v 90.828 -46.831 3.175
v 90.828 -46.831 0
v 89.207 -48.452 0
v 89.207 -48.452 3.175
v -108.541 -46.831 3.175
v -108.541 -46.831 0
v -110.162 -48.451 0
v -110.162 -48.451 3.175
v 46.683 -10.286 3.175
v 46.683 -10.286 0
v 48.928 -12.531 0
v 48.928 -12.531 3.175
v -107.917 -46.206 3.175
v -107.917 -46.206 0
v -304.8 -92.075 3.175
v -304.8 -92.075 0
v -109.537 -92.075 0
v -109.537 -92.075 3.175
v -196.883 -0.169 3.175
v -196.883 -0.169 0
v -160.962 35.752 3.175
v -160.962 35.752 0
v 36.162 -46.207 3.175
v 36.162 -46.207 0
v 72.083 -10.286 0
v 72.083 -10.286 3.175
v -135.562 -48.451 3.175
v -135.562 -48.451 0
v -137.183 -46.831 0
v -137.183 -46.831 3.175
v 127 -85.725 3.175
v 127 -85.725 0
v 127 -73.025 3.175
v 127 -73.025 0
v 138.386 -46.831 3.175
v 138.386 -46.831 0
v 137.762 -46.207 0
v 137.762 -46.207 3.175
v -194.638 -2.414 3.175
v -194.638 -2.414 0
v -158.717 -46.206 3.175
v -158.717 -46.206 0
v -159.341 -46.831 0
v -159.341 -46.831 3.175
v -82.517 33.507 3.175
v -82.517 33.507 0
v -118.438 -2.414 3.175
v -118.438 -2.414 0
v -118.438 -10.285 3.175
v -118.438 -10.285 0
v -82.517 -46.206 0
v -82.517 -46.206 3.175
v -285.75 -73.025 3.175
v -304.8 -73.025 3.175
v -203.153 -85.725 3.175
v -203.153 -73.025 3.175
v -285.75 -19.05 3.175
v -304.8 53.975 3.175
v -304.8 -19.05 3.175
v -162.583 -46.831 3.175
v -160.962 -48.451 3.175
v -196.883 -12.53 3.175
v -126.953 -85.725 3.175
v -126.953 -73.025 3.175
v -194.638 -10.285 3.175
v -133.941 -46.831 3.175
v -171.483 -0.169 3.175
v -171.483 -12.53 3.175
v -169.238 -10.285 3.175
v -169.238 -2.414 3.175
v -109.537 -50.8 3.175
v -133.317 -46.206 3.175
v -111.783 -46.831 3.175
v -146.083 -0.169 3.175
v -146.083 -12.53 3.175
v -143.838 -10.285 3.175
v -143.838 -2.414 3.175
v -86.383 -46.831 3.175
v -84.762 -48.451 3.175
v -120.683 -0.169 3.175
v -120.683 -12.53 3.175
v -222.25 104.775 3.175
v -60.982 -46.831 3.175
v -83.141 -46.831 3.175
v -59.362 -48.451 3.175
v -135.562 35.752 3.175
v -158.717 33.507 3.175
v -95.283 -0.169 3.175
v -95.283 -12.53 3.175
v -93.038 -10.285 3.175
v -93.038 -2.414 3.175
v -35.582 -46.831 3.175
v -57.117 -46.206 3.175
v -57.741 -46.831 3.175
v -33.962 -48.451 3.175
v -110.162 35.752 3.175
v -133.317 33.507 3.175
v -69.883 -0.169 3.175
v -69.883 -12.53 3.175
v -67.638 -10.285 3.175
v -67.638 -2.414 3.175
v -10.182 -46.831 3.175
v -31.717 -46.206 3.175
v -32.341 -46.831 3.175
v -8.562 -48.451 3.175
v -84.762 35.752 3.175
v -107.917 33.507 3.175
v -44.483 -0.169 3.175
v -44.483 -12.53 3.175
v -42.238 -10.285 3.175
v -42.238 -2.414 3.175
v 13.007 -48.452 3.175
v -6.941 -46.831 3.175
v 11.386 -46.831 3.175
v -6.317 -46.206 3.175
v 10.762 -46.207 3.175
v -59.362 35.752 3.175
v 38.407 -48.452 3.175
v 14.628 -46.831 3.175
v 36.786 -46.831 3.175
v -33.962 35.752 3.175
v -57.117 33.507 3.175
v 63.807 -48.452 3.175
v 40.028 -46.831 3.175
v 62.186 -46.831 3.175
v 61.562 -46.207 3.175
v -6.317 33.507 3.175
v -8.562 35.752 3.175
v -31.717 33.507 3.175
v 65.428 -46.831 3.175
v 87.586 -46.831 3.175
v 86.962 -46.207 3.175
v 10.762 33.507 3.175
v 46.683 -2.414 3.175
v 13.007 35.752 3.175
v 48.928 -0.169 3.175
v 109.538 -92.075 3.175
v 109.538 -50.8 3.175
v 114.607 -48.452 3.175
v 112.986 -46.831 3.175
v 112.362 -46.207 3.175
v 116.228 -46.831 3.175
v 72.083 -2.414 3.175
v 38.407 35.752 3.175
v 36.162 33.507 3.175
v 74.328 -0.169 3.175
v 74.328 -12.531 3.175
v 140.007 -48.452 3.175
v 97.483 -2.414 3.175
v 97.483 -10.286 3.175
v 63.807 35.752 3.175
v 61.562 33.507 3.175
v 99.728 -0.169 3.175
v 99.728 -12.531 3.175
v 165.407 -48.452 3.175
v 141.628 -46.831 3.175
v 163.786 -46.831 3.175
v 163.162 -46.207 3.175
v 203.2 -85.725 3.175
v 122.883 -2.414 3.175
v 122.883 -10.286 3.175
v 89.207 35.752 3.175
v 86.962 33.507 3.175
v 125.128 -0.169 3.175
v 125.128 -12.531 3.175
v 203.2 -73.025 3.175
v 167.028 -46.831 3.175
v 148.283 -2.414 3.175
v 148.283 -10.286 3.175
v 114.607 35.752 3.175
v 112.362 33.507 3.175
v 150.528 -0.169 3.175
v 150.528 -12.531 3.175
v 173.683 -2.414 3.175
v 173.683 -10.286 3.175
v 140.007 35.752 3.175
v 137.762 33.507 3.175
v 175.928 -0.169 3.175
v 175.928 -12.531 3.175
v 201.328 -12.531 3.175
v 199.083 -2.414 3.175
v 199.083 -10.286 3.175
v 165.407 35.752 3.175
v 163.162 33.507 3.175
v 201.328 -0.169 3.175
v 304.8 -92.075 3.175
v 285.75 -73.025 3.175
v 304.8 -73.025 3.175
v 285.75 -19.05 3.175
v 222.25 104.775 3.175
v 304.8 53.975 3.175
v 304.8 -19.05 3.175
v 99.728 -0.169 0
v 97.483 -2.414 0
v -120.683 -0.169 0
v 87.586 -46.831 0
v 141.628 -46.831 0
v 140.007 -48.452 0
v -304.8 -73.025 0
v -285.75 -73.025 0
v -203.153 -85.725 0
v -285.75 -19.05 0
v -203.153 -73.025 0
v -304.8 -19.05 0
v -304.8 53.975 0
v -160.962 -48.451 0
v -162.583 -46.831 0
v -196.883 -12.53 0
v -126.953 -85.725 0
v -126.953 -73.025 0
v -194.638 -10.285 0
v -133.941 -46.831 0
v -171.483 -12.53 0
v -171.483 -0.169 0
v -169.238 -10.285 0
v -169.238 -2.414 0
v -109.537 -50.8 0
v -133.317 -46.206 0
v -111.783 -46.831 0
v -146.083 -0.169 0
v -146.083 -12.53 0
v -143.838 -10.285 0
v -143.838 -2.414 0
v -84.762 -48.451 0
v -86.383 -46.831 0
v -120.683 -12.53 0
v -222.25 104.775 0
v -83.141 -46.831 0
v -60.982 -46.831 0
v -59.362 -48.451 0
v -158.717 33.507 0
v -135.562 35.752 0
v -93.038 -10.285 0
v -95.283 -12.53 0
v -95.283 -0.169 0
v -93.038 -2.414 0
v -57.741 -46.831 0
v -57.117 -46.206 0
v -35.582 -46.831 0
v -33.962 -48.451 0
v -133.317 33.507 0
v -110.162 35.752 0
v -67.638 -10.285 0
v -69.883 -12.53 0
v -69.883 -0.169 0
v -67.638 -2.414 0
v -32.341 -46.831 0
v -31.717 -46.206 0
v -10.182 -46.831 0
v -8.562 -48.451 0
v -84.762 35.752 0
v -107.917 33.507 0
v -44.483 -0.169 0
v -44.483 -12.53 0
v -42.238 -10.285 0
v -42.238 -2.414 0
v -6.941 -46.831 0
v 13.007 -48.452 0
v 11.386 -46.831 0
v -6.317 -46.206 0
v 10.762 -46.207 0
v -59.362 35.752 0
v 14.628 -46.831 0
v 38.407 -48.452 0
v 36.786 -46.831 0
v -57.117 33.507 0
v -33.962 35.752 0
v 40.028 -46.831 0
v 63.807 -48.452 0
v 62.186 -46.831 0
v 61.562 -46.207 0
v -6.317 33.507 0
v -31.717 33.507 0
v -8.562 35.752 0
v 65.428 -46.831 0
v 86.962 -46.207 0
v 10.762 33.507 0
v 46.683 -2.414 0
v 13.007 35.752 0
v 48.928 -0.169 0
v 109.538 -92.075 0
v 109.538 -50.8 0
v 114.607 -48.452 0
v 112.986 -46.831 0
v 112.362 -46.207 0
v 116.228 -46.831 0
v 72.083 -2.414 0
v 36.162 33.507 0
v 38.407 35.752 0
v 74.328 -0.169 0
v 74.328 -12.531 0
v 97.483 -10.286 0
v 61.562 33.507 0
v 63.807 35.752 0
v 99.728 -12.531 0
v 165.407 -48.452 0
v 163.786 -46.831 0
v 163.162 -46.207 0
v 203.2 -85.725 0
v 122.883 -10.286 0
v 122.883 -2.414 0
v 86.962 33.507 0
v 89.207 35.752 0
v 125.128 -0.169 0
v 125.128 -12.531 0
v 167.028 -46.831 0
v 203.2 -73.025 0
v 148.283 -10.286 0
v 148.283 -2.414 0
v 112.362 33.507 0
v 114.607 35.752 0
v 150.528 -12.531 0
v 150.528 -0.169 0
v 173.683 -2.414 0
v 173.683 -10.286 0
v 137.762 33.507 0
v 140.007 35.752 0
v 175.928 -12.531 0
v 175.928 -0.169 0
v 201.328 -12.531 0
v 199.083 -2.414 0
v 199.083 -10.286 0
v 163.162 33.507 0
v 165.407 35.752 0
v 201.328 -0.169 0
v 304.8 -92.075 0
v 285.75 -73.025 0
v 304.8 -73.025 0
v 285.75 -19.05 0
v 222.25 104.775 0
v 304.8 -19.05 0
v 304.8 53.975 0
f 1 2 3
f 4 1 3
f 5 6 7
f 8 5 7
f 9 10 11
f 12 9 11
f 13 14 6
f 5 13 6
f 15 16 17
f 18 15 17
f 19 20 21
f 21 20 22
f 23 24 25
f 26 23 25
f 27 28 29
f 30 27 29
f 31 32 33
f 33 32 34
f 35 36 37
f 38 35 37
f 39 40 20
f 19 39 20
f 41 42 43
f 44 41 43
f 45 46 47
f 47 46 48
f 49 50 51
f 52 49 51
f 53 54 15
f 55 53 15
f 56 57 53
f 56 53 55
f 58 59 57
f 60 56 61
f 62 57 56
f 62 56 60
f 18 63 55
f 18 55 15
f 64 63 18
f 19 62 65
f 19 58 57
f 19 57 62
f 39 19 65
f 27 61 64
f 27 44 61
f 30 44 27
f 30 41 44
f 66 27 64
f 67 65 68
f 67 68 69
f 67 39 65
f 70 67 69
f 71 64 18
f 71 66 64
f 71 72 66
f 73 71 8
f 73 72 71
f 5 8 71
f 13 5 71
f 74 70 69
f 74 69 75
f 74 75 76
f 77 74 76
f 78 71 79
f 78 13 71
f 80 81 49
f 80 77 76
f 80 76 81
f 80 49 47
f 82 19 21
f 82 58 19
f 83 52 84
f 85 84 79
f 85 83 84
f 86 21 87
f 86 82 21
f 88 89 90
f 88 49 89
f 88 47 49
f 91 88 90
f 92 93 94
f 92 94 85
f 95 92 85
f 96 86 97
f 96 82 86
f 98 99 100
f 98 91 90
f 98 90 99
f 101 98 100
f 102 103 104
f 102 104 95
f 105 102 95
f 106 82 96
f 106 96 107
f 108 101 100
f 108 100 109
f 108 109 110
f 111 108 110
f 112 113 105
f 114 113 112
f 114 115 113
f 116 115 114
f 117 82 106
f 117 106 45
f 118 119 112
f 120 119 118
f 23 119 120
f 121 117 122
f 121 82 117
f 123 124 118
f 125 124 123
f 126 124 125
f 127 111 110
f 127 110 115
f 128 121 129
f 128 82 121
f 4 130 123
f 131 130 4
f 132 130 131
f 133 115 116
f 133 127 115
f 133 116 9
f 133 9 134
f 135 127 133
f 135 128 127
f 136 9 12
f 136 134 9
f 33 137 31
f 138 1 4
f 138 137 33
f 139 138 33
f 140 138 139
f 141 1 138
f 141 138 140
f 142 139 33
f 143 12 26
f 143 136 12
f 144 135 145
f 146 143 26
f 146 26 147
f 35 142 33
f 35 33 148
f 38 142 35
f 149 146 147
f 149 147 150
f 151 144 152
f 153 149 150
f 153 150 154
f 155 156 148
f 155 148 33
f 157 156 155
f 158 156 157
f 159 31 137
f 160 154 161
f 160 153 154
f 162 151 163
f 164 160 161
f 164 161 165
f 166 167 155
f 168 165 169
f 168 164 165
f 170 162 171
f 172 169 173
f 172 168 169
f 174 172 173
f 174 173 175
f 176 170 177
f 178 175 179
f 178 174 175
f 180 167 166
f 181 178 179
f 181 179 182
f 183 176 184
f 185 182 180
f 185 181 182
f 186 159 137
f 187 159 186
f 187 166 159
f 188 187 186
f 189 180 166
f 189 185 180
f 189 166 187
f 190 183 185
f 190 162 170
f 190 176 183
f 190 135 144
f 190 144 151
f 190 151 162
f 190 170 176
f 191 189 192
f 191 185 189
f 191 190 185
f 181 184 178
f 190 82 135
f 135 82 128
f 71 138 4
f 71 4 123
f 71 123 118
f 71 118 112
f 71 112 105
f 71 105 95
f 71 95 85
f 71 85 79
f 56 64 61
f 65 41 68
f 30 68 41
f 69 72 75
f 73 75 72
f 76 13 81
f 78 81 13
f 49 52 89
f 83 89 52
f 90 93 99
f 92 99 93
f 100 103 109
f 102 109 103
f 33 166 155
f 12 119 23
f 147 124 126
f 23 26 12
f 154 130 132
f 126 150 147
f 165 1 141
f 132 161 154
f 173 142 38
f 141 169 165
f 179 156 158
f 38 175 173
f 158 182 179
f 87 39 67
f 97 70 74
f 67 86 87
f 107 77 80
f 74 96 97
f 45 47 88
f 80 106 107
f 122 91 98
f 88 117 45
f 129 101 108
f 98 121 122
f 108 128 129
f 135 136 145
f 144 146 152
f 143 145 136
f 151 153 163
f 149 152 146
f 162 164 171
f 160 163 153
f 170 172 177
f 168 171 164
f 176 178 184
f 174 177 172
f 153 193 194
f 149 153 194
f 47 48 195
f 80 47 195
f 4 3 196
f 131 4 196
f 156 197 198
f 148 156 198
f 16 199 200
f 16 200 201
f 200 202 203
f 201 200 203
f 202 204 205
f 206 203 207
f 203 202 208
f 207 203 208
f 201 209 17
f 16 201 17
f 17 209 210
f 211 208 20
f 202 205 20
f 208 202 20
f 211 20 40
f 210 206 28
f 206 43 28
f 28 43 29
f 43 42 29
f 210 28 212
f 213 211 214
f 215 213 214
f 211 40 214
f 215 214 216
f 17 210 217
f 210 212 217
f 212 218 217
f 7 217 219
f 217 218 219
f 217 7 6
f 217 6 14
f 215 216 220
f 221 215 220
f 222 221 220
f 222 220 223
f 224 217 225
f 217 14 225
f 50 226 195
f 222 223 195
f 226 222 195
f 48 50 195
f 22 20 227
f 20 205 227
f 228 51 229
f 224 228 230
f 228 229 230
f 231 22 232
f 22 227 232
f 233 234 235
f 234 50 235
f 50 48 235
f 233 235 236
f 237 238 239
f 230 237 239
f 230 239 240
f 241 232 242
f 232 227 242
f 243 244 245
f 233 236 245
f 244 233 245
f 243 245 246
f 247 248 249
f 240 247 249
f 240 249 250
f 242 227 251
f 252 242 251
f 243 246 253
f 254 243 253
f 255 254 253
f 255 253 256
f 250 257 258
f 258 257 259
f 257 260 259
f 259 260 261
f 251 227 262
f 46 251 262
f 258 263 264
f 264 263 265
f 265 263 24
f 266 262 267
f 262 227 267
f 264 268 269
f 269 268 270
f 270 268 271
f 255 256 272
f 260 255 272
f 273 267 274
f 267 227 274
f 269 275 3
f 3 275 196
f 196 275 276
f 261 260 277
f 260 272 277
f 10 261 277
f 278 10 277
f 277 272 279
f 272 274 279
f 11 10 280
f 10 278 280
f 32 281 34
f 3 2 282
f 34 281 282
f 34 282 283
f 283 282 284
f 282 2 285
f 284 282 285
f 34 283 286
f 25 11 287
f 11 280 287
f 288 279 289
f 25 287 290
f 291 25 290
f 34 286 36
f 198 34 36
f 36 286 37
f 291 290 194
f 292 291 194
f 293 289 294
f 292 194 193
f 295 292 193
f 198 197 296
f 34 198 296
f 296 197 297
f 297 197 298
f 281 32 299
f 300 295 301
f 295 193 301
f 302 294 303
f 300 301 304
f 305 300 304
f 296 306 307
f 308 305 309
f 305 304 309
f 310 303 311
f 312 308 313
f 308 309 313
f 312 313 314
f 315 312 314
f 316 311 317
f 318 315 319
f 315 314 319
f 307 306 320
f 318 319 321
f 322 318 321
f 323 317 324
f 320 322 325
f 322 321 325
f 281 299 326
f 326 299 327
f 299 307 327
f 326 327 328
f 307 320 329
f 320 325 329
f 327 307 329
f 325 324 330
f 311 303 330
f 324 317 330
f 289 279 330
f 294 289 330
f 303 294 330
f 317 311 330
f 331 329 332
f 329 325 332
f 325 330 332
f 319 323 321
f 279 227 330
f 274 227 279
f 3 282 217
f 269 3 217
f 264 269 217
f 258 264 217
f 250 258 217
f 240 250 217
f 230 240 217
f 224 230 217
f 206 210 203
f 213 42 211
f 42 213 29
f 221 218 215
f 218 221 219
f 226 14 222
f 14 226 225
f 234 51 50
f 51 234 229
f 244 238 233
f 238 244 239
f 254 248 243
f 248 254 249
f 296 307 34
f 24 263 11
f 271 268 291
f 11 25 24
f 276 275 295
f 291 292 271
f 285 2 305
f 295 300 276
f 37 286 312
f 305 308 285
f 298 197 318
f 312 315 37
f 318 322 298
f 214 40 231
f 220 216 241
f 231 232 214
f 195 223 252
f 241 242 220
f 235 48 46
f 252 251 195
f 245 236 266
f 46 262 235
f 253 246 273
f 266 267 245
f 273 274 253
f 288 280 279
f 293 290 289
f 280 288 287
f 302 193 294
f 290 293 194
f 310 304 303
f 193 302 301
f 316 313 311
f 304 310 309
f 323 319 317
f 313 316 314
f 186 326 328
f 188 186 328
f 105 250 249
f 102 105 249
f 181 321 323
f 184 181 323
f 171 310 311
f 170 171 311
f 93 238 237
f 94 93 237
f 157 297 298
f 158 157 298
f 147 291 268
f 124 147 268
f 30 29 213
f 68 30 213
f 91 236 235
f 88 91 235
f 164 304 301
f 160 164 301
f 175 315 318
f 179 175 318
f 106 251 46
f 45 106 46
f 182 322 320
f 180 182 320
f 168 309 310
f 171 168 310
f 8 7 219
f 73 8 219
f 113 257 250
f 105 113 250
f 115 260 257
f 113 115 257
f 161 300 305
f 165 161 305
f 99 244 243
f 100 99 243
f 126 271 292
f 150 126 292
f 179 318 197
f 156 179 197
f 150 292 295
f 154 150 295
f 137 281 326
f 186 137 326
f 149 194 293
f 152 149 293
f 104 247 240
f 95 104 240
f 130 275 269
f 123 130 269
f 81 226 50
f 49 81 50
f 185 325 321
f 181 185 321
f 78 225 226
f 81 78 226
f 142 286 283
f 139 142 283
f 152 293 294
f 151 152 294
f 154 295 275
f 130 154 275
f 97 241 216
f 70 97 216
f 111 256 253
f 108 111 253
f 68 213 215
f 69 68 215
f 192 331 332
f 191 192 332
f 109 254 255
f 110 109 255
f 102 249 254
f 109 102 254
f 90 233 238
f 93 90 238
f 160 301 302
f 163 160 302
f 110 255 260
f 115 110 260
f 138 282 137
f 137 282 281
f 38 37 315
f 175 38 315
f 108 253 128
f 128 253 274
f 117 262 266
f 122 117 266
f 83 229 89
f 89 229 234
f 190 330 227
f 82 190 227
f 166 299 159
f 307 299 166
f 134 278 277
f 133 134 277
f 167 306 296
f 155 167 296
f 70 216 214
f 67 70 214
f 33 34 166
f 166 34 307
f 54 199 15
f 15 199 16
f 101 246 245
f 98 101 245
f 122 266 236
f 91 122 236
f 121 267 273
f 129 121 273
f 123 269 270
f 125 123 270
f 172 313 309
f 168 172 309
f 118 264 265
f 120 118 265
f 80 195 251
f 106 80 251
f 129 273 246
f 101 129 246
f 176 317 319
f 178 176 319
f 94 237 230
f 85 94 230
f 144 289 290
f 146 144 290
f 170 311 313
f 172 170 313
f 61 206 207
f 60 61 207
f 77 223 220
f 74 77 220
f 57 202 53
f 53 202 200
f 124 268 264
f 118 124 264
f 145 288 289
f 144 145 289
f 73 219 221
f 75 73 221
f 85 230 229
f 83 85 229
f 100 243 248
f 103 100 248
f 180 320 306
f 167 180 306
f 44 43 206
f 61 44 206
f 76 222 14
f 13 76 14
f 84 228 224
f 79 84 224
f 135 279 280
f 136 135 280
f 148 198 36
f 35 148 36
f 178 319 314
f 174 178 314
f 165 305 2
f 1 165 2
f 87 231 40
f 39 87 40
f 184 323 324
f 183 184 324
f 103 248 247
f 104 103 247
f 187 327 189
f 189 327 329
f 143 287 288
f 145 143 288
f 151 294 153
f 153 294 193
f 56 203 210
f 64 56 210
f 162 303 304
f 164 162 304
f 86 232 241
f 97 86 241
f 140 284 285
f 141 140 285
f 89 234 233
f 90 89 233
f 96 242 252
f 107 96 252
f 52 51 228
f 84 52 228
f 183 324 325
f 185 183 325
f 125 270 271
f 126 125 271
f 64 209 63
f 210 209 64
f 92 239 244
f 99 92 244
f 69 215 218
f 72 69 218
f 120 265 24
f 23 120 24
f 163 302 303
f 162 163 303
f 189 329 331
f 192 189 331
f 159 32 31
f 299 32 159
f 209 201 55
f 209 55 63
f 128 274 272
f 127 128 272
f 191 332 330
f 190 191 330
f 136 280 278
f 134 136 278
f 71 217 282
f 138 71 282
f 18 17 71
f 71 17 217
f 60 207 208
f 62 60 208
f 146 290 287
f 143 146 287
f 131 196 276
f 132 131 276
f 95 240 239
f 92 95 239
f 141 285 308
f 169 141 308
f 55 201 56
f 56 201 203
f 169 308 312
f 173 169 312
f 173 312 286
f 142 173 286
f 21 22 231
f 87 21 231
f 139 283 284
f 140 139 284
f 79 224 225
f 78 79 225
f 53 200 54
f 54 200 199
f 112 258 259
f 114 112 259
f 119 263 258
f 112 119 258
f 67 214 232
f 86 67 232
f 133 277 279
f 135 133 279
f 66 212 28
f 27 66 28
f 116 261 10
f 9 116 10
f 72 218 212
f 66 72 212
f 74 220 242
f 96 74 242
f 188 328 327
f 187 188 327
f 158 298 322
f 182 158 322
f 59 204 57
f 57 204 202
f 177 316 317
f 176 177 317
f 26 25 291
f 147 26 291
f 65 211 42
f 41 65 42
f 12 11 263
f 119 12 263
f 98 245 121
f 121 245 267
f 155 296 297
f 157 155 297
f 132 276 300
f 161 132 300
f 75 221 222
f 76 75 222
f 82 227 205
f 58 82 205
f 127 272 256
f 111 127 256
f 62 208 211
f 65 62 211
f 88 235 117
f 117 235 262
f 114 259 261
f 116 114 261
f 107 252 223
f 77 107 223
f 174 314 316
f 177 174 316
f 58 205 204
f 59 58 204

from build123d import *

# Parameters (mm, degrees)
F0_W     = 76.2
F0_H     = 12.7
F1_DEPTH = 3.175
F2_DEPTH = 12.7


# Not quite as in the source:
# - a length typed as a fraction of an inch, garbled in the dataset ("3 / 203.2 mm" for 3/8 in), is restored


with BuildPart() as f1:
    # F0 (on Top) → F1 (new body)
    with BuildSketch(Plane.XY):
        Polygon((285.7501016, -19.0500762), (304.8001016, -19.0500762), (304.8001016, 53.9749238), (222.2501016, 104.7749238), (-222.2500762, 104.7749238), (-304.8000762, 53.9749238), (-304.8000762, -19.0500762), (-285.7500762, -19.0500762), (-285.7500762, -73.0248984), (-304.8000762, -73.0248984), (-304.8000762, -104.7748984), (-109.5373984, -104.7748984), (-109.5373984, -67.4683182), (-244.475254, -67.4683182), (-244.475254, -46.8308182), (-162.5825794541, -46.8308182), (-196.8829692, -12.5304042), (-194.6378124, -10.285222), (-158.7168276, -46.2063846), (-159.3413106539, -46.8308182), (-137.1825794541, -46.8308182), (-171.4829692, -12.5304042), (-169.2378124, -10.285222), (-133.3168276, -46.2063846), (-133.9413106539, -46.8308182), (-111.7825794541, -46.8308182), (-146.0829692, -12.5304042), (-143.8378124, -10.285222), (-107.9168276, -46.2063846), (-108.5413106539, -46.8308182), (-86.3825794541, -46.8308182), (-120.6829692, -12.5304042), (-118.4378124, -10.285222), (-82.5168276, -46.2063846), (-83.1413106539, -46.8308182), (-60.9824096755, -46.8308182), (-95.2829692, -12.5304042), (-93.0378124, -10.285222), (-57.1170054, -46.2063846), (-57.7413895461, -46.8308182), (-35.5824096755, -46.8308182), (-69.8829692, -12.5304042), (-67.6378124, -10.285222), (-31.7170054, -46.2063846), (-32.3413895461, -46.8308182), (-10.1824176969, -46.8308182), (-44.483147, -12.5304042), (-42.2376346, -10.285222), (-6.3170054, -46.2063846), (-6.9413895461, -46.8308182), (11.3860423894, -46.8308182), (10.7618784, -46.2065624), (46.682533, -10.2855776), (48.9280454, -12.5307598), (14.6276231923, -46.8308182), (36.7860423894, -46.8308182), (36.1618784, -46.2065624), (72.082533, -10.2855776), (74.3280454, -12.5307598), (40.0276231923, -46.8308182), (62.1860423894, -46.8308182), (61.5618784, -46.2065624), (97.482533, -10.2855776), (99.7280454, -12.5307598), (65.4276231923, -46.8308182), (87.5860423894, -46.8308182), (86.9618784, -46.2065624), (122.882533, -10.2855776), (125.1280454, -12.5307598), (90.8276231923, -46.8308182), (112.9860423894, -46.8308182), (112.3618784, -46.2065624), (148.282533, -10.2855776), (150.5280454, -12.5307598), (116.2276231923, -46.8308182), (138.3860423894, -46.8308182), (137.7618784, -46.2065624), (173.682533, -10.2855776), (175.9280454, -12.5307598), (141.6276231923, -46.8308182), (163.7860423894, -46.8308182), (163.1618784, -46.2065624), (199.082533, -10.2855776), (201.3280454, -12.5307598), (167.0276231923, -46.8308182), (244.474746, -46.8308182), (244.474746, -67.4683182), (109.5376016, -67.4683182), (109.5376016, -104.7748984), (304.8001016, -104.7748984), (304.8001016, -73.0248984), (285.7501016, -73.0248984), align=None)
        with Locations((-165.052883, -79.3748984)):
            Rectangle(F0_W, F0_H, mode=Mode.SUBTRACT)
        with Locations((165.1001016, -79.3748984)):
            Rectangle(F0_W, F0_H, mode=Mode.SUBTRACT)
        Polygon((-158.7168276, 33.506918), (-194.6378124, -2.4142192), (-196.8829692, -0.1690624), (-160.9620098, 35.7519224), align=None, mode=Mode.SUBTRACT)
        Polygon((-133.3168276, 33.506918), (-169.2378124, -2.4142192), (-171.4829692, -0.1690624), (-135.5620098, 35.7519224), align=None, mode=Mode.SUBTRACT)
        Polygon((-107.9168276, 33.506918), (-143.8378124, -2.4142192), (-146.0829692, -0.1690624), (-110.1620098, 35.7519224), align=None, mode=Mode.SUBTRACT)
        Polygon((-82.5168276, 33.506918), (-118.4378124, -2.4142192), (-120.6829692, -0.1690624), (-84.7620098, 35.7519224), align=None, mode=Mode.SUBTRACT)
        Polygon((-57.1170054, 33.506918), (-93.0378124, -2.4142192), (-95.2829692, -0.1690624), (-59.361832, 35.7519224), align=None, mode=Mode.SUBTRACT)
        Polygon((-31.7170054, 33.506918), (-67.6378124, -2.4142192), (-69.8829692, -0.1690624), (-33.961832, 35.7519224), align=None, mode=Mode.SUBTRACT)
        Polygon((-6.3170054, 33.506918), (-42.2376346, -2.4142192), (-44.483147, -0.1690624), (-8.561832, 35.7519224), align=None, mode=Mode.SUBTRACT)
        Polygon((13.006705, 35.752278), (48.9280454, -0.1687068), (46.682533, -2.413889), (10.7618784, 33.5070958), align=None, mode=Mode.SUBTRACT)
        Polygon((38.406705, 35.752278), (74.3280454, -0.1687068), (72.082533, -2.413889), (36.1618784, 33.5070958), align=None, mode=Mode.SUBTRACT)
        Polygon((63.806705, 35.752278), (99.7280454, -0.1687068), (97.482533, -2.413889), (61.5618784, 33.5070958), align=None, mode=Mode.SUBTRACT)
        Polygon((89.206705, 35.752278), (125.1280454, -0.1687068), (122.882533, -2.413889), (86.9618784, 33.5070958), align=None, mode=Mode.SUBTRACT)
        Polygon((114.606705, 35.752278), (150.5280454, -0.1687068), (148.282533, -2.413889), (112.3618784, 33.5070958), align=None, mode=Mode.SUBTRACT)
        Polygon((140.006705, 35.752278), (175.9280454, -0.1687068), (173.682533, -2.413889), (137.7618784, 33.5070958), align=None, mode=Mode.SUBTRACT)
        Polygon((165.406705, 35.752278), (201.3280454, -0.1687068), (199.082533, -2.413889), (163.1618784, 33.5070958), align=None, mode=Mode.SUBTRACT)
        Polygon((109.5376016, -50.7998984), (109.5376016, -67.4683182), (244.474746, -67.4683182), (244.474746, -46.8308182), (167.0276231923, -46.8308182), (165.406705, -48.4517192), (163.7860423894, -46.8308182), (141.6276231923, -46.8308182), (140.006705, -48.4517192), (138.3860423894, -46.8308182), (116.2276231923, -46.8308182), (114.606705, -48.4517192), (112.9860423894, -46.8308182), (90.8276231923, -46.8308182), (89.206705, -48.4517192), (87.5860423894, -46.8308182), (65.4276231923, -46.8308182), (63.806705, -48.4517192), (62.1860423894, -46.8308182), (40.0276231923, -46.8308182), (38.406705, -48.4517192), (36.7860423894, -46.8308182), (14.6276231923, -46.8308182), (13.006705, -48.4517192), (11.3860423894, -46.8308182), (-6.9413895461, -46.8308182), (-8.561832, -48.451389), (-10.1824176969, -46.8308182), (-32.3413895461, -46.8308182), (-33.961832, -48.451389), (-35.5824096755, -46.8308182), (-57.7413895461, -46.8308182), (-59.361832, -48.451389), (-60.9824096755, -46.8308182), (-83.1413106539, -46.8308182), (-84.7620098, -48.451389), (-86.3825794541, -46.8308182), (-108.5413106539, -46.8308182), (-110.1620098, -48.451389), (-111.7825794541, -46.8308182), (-133.9413106539, -46.8308182), (-135.5620098, -48.451389), (-137.1825794541, -46.8308182), (-159.3413106539, -46.8308182), (-160.9620098, -48.451389), (-162.5825794541, -46.8308182), (-244.475254, -46.8308182), (-244.475254, -67.4683182), (-109.5373984, -67.4683182), (-109.5373984, -50.7998984), align=None)
    extrude(amount=F1_DEPTH)

    # F2 (cut): faces of the model
    f2_faces = [f1.faces().sort_by_distance(p)[0] for p in [
        (-207.1687373, -104.7748984, 1.5875),
        (207.1688516, -104.7748984, 1.5875),
    ]]
    extrude(f2_faces, amount=-F2_DEPTH, mode=Mode.SUBTRACT)


solid = f1.part
